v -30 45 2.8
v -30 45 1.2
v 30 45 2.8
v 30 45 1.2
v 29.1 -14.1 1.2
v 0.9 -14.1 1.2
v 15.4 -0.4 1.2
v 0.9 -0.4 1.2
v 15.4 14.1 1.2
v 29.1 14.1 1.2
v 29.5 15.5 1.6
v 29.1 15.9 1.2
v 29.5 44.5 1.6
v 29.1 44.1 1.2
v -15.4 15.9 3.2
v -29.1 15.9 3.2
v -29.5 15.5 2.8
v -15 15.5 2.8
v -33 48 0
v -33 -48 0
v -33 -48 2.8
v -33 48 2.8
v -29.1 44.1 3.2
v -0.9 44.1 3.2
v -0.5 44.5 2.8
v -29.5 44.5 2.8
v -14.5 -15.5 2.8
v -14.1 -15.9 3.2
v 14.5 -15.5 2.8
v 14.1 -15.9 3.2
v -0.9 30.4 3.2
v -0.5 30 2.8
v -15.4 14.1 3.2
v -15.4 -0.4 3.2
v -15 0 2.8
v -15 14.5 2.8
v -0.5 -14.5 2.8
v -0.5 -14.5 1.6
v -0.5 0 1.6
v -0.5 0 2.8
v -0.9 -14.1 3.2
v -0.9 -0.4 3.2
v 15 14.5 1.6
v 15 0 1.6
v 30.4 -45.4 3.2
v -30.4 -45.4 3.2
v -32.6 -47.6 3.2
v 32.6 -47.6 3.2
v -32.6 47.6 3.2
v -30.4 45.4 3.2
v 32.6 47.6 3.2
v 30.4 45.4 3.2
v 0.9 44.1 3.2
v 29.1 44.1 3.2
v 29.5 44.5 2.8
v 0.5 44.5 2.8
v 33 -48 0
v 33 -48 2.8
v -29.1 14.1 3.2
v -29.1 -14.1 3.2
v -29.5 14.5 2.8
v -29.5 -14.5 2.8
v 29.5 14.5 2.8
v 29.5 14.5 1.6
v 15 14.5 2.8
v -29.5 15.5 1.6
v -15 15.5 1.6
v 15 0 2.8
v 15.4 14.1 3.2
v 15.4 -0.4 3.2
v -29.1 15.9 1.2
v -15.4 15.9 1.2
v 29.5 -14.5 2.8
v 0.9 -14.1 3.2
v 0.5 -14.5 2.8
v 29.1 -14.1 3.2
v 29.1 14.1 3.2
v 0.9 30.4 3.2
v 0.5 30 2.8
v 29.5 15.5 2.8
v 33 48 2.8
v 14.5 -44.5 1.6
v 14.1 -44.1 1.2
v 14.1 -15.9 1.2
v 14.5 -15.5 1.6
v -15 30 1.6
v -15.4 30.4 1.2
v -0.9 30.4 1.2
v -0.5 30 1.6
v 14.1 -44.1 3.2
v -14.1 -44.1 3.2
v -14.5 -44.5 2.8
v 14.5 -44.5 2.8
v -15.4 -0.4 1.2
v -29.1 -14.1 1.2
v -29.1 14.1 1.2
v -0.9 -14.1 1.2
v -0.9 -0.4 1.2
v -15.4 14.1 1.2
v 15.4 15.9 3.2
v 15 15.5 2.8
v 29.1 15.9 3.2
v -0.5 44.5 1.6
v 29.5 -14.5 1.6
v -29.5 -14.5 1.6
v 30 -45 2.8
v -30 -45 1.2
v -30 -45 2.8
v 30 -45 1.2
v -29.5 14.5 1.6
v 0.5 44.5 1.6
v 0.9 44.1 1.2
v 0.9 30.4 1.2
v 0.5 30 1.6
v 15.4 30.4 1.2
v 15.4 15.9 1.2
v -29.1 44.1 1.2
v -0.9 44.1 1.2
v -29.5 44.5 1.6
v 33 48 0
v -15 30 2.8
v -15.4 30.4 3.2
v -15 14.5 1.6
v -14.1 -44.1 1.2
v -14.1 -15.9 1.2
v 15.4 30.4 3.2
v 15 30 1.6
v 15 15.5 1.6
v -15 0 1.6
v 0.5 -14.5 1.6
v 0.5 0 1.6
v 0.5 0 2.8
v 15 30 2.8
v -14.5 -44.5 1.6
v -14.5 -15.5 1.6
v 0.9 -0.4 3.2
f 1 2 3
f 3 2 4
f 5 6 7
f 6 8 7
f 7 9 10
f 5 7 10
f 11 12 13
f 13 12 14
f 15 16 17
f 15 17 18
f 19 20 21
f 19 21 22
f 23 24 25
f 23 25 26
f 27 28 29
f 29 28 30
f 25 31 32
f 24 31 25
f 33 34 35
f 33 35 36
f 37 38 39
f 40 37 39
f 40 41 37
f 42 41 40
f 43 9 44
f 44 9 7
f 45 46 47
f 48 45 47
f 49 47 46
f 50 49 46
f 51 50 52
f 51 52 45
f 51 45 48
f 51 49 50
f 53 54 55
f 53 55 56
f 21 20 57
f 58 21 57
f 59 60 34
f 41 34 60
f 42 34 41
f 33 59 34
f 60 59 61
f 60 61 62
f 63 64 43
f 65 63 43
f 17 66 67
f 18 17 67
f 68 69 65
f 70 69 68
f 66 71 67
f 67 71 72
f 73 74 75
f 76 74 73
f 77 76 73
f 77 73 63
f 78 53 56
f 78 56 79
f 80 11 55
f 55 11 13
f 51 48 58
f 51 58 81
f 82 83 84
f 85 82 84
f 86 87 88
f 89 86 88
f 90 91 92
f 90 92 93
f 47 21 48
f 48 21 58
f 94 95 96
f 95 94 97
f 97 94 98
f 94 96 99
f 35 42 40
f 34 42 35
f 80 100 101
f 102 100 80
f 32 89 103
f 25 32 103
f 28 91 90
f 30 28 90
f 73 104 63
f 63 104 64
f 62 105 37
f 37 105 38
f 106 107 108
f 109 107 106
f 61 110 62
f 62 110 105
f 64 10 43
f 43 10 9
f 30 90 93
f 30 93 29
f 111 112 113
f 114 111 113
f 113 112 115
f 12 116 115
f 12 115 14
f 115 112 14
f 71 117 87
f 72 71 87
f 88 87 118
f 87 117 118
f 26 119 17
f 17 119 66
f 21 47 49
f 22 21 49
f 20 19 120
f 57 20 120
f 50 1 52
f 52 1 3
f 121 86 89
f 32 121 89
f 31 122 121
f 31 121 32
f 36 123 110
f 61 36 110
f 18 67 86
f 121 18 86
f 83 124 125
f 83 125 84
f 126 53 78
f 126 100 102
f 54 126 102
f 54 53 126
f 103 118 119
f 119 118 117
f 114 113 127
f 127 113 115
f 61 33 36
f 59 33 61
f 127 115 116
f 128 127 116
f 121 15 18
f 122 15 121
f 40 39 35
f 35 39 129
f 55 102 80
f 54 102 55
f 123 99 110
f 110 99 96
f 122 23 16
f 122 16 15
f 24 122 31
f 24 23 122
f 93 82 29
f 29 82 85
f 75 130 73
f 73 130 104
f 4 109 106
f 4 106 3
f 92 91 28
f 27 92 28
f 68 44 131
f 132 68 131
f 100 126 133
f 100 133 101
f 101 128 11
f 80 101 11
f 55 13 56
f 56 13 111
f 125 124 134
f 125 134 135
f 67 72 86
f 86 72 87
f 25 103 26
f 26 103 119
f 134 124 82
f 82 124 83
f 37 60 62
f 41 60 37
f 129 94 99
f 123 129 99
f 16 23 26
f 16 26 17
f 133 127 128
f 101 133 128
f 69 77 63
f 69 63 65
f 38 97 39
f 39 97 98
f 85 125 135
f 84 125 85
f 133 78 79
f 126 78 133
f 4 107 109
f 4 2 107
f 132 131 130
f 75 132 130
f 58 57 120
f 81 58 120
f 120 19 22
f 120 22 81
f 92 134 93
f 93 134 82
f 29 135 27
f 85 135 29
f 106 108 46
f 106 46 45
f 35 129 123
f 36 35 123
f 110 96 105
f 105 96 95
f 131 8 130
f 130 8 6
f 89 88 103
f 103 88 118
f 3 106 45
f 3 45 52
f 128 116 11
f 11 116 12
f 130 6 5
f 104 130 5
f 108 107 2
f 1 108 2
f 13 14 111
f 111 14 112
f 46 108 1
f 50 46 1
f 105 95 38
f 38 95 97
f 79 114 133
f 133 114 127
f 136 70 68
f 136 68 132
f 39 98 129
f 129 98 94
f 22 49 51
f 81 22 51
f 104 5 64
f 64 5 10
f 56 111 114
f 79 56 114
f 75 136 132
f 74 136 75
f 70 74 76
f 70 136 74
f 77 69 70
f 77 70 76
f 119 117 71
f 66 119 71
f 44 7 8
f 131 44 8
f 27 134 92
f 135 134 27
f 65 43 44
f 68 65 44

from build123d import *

# Parameters (mm, degrees)
F0_W      = 66
F0_H      = 96
F0_W_2    = 60
F0_H_2    = 90
F1_DEPTH  = 1.2
F2_DEPTH  = 3.2
F4_DEPTH  = 2
F3_W      = 29
F3_H      = 29
F5_SIZE   = 0.4
F5_2_SIZE = 0.4
F5_3_SIZE = 0.4
F5_4_SIZE = 0.4
F5_5_SIZE = 0.4
F5_6_SIZE = 0.4


with BuildPart() as f1:
    # F0 (on Top) → F1 (new body)
    with BuildSketch(Plane.XY):
        Rectangle(F0_W, F0_H)
        Rectangle(F0_W_2, F0_H_2, mode=Mode.SUBTRACT)
        Rectangle(F0_W_2, F0_H_2)
    extrude(amount=F1_DEPTH)

    # F0 (on Top) → F2 (join)
    with BuildSketch(Plane.XY):
        Rectangle(F0_W, F0_H)
        Rectangle(F0_W_2, F0_H_2, mode=Mode.SUBTRACT)
    extrude(amount=F2_DEPTH)

    # F5#6
    f5_6_edges = [f1.edges().sort_by_distance(p)[0] for p in [
        (0, 48, 3.2),
        (-33, 0, 3.2),
        (0, -48, 3.2),
        (33, 0, 3.2),
        (-30, 0, 3.2),
        (0, 45, 3.2),
        (30, 0, 3.2),
        (0, -45, 3.2),
    ]]
    chamfer(f5_6_edges, length=F5_6_SIZE)


with BuildPart() as f4:
    # F3 (on face) → F4 (new body)
    with BuildSketch(Plane.XY.offset(1.2)):
        Polygon((-0.5, 44.5), (-29.5, 44.5), (-29.5, 15.5), (-15, 15.5), (-15, 30), (-0.5, 30), align=None)
    extrude(amount=F4_DEPTH)

    # F5
    f5_edges = [f4.edges().sort_by_distance(p)[0] for p in [
        (-15, 44.5, 3.2),
        (-29.5, 30, 3.2),
        (-22.25, 15.5, 3.2),
        (-15, 22.75, 3.2),
        (-7.75, 30, 3.2),
        (-0.5, 37.25, 3.2),
        (-15, 44.5, 1.2),
        (-29.5, 30, 1.2),
        (-22.25, 15.5, 1.2),
        (-15, 22.75, 1.2),
        (-7.75, 30, 1.2),
        (-0.5, 37.25, 1.2),
    ]]
    chamfer(f5_edges, length=F5_SIZE)


with BuildPart() as f4b:
    # F3 (on face) → F4, piece 2 (new body)
    with BuildSketch(Plane.XY.offset(1.2)):
        Polygon((29.5, 15.5), (29.5, 44.5), (0.5, 44.5), (0.5, 30), (15, 30), (15, 15.5), align=None)
    extrude(amount=F4_DEPTH)

    # F5#2
    f5_2_edges = [f4b.edges().sort_by_distance(p)[0] for p in [
        (29.5, 30, 3.2),
        (15, 44.5, 3.2),
        (0.5, 37.25, 3.2),
        (7.75, 30, 3.2),
        (15, 22.75, 3.2),
        (22.25, 15.5, 3.2),
        (29.5, 30, 1.2),
        (15, 44.5, 1.2),
        (0.5, 37.25, 1.2),
        (7.75, 30, 1.2),
        (15, 22.75, 1.2),
        (22.25, 15.5, 1.2),
    ]]
    chamfer(f5_2_edges, length=F5_2_SIZE)


with BuildPart() as f4c:
    # F3 (on face) → F4, piece 3 (new body)
    with BuildSketch(Plane.XY.offset(1.2)):
        Polygon((-29.5, 14.5), (-29.5, -14.5), (-0.5, -14.5), (-0.5, 0), (-15, 0), (-15, 14.5), align=None)
    extrude(amount=F4_DEPTH)

    # F5#4
    f5_4_edges = [f4c.edges().sort_by_distance(p)[0] for p in [
        (-29.5, 0, 3.2),
        (-15, -14.5, 3.2),
        (-0.5, -7.25, 3.2),
        (-7.75, 0, 3.2),
        (-15, 7.25, 3.2),
        (-22.25, 14.5, 3.2),
        (-29.5, 0, 1.2),
        (-15, -14.5, 1.2),
        (-0.5, -7.25, 1.2),
        (-7.75, 0, 1.2),
        (-15, 7.25, 1.2),
        (-22.25, 14.5, 1.2),
    ]]
    chamfer(f5_4_edges, length=F5_4_SIZE)


with BuildPart() as f4d:
    # F3 (on face) → F4, piece 4 (new body)
    with BuildSketch(Plane.XY.offset(1.2)):
        Polygon((0.5, -14.5), (29.5, -14.5), (29.5, 14.5), (15, 14.5), (15, 0), (0.5, 0), align=None)
    extrude(amount=F4_DEPTH)

    # F5#3
    f5_3_edges = [f4d.edges().sort_by_distance(p)[0] for p in [
        (15, -14.5, 3.2),
        (29.5, 0, 3.2),
        (22.25, 14.5, 3.2),
        (15, 7.25, 3.2),
        (7.75, 0, 3.2),
        (0.5, -7.25, 3.2),
        (15, -14.5, 1.2),
        (29.5, 0, 1.2),
        (22.25, 14.5, 1.2),
        (15, 7.25, 1.2),
        (7.75, 0, 1.2),
        (0.5, -7.25, 1.2),
    ]]
    chamfer(f5_3_edges, length=F5_3_SIZE)


with BuildPart() as f4e:
    # F3 (on face) → F4, piece 5 (new body)
    with BuildSketch(Plane.XY.offset(1.2)):
        with Locations((0, -30)):
            Rectangle(F3_W, F3_H)
    extrude(amount=F4_DEPTH)

    # F5#5
    f5_5_edges = [f4e.edges().sort_by_distance(p)[0] for p in [
        (-14.5, -30, 3.2),
        (0, -44.5, 3.2),
        (14.5, -30, 3.2),
        (0, -15.5, 3.2),
        (-14.5, -30, 1.2),
        (0, -44.5, 1.2),
        (14.5, -30, 1.2),
        (0, -15.5, 1.2),
    ]]
    chamfer(f5_5_edges, length=F5_5_SIZE)


solid = Compound([f1.part, f4.part, f4b.part, f4c.part, f4d.part, f4e.part])
